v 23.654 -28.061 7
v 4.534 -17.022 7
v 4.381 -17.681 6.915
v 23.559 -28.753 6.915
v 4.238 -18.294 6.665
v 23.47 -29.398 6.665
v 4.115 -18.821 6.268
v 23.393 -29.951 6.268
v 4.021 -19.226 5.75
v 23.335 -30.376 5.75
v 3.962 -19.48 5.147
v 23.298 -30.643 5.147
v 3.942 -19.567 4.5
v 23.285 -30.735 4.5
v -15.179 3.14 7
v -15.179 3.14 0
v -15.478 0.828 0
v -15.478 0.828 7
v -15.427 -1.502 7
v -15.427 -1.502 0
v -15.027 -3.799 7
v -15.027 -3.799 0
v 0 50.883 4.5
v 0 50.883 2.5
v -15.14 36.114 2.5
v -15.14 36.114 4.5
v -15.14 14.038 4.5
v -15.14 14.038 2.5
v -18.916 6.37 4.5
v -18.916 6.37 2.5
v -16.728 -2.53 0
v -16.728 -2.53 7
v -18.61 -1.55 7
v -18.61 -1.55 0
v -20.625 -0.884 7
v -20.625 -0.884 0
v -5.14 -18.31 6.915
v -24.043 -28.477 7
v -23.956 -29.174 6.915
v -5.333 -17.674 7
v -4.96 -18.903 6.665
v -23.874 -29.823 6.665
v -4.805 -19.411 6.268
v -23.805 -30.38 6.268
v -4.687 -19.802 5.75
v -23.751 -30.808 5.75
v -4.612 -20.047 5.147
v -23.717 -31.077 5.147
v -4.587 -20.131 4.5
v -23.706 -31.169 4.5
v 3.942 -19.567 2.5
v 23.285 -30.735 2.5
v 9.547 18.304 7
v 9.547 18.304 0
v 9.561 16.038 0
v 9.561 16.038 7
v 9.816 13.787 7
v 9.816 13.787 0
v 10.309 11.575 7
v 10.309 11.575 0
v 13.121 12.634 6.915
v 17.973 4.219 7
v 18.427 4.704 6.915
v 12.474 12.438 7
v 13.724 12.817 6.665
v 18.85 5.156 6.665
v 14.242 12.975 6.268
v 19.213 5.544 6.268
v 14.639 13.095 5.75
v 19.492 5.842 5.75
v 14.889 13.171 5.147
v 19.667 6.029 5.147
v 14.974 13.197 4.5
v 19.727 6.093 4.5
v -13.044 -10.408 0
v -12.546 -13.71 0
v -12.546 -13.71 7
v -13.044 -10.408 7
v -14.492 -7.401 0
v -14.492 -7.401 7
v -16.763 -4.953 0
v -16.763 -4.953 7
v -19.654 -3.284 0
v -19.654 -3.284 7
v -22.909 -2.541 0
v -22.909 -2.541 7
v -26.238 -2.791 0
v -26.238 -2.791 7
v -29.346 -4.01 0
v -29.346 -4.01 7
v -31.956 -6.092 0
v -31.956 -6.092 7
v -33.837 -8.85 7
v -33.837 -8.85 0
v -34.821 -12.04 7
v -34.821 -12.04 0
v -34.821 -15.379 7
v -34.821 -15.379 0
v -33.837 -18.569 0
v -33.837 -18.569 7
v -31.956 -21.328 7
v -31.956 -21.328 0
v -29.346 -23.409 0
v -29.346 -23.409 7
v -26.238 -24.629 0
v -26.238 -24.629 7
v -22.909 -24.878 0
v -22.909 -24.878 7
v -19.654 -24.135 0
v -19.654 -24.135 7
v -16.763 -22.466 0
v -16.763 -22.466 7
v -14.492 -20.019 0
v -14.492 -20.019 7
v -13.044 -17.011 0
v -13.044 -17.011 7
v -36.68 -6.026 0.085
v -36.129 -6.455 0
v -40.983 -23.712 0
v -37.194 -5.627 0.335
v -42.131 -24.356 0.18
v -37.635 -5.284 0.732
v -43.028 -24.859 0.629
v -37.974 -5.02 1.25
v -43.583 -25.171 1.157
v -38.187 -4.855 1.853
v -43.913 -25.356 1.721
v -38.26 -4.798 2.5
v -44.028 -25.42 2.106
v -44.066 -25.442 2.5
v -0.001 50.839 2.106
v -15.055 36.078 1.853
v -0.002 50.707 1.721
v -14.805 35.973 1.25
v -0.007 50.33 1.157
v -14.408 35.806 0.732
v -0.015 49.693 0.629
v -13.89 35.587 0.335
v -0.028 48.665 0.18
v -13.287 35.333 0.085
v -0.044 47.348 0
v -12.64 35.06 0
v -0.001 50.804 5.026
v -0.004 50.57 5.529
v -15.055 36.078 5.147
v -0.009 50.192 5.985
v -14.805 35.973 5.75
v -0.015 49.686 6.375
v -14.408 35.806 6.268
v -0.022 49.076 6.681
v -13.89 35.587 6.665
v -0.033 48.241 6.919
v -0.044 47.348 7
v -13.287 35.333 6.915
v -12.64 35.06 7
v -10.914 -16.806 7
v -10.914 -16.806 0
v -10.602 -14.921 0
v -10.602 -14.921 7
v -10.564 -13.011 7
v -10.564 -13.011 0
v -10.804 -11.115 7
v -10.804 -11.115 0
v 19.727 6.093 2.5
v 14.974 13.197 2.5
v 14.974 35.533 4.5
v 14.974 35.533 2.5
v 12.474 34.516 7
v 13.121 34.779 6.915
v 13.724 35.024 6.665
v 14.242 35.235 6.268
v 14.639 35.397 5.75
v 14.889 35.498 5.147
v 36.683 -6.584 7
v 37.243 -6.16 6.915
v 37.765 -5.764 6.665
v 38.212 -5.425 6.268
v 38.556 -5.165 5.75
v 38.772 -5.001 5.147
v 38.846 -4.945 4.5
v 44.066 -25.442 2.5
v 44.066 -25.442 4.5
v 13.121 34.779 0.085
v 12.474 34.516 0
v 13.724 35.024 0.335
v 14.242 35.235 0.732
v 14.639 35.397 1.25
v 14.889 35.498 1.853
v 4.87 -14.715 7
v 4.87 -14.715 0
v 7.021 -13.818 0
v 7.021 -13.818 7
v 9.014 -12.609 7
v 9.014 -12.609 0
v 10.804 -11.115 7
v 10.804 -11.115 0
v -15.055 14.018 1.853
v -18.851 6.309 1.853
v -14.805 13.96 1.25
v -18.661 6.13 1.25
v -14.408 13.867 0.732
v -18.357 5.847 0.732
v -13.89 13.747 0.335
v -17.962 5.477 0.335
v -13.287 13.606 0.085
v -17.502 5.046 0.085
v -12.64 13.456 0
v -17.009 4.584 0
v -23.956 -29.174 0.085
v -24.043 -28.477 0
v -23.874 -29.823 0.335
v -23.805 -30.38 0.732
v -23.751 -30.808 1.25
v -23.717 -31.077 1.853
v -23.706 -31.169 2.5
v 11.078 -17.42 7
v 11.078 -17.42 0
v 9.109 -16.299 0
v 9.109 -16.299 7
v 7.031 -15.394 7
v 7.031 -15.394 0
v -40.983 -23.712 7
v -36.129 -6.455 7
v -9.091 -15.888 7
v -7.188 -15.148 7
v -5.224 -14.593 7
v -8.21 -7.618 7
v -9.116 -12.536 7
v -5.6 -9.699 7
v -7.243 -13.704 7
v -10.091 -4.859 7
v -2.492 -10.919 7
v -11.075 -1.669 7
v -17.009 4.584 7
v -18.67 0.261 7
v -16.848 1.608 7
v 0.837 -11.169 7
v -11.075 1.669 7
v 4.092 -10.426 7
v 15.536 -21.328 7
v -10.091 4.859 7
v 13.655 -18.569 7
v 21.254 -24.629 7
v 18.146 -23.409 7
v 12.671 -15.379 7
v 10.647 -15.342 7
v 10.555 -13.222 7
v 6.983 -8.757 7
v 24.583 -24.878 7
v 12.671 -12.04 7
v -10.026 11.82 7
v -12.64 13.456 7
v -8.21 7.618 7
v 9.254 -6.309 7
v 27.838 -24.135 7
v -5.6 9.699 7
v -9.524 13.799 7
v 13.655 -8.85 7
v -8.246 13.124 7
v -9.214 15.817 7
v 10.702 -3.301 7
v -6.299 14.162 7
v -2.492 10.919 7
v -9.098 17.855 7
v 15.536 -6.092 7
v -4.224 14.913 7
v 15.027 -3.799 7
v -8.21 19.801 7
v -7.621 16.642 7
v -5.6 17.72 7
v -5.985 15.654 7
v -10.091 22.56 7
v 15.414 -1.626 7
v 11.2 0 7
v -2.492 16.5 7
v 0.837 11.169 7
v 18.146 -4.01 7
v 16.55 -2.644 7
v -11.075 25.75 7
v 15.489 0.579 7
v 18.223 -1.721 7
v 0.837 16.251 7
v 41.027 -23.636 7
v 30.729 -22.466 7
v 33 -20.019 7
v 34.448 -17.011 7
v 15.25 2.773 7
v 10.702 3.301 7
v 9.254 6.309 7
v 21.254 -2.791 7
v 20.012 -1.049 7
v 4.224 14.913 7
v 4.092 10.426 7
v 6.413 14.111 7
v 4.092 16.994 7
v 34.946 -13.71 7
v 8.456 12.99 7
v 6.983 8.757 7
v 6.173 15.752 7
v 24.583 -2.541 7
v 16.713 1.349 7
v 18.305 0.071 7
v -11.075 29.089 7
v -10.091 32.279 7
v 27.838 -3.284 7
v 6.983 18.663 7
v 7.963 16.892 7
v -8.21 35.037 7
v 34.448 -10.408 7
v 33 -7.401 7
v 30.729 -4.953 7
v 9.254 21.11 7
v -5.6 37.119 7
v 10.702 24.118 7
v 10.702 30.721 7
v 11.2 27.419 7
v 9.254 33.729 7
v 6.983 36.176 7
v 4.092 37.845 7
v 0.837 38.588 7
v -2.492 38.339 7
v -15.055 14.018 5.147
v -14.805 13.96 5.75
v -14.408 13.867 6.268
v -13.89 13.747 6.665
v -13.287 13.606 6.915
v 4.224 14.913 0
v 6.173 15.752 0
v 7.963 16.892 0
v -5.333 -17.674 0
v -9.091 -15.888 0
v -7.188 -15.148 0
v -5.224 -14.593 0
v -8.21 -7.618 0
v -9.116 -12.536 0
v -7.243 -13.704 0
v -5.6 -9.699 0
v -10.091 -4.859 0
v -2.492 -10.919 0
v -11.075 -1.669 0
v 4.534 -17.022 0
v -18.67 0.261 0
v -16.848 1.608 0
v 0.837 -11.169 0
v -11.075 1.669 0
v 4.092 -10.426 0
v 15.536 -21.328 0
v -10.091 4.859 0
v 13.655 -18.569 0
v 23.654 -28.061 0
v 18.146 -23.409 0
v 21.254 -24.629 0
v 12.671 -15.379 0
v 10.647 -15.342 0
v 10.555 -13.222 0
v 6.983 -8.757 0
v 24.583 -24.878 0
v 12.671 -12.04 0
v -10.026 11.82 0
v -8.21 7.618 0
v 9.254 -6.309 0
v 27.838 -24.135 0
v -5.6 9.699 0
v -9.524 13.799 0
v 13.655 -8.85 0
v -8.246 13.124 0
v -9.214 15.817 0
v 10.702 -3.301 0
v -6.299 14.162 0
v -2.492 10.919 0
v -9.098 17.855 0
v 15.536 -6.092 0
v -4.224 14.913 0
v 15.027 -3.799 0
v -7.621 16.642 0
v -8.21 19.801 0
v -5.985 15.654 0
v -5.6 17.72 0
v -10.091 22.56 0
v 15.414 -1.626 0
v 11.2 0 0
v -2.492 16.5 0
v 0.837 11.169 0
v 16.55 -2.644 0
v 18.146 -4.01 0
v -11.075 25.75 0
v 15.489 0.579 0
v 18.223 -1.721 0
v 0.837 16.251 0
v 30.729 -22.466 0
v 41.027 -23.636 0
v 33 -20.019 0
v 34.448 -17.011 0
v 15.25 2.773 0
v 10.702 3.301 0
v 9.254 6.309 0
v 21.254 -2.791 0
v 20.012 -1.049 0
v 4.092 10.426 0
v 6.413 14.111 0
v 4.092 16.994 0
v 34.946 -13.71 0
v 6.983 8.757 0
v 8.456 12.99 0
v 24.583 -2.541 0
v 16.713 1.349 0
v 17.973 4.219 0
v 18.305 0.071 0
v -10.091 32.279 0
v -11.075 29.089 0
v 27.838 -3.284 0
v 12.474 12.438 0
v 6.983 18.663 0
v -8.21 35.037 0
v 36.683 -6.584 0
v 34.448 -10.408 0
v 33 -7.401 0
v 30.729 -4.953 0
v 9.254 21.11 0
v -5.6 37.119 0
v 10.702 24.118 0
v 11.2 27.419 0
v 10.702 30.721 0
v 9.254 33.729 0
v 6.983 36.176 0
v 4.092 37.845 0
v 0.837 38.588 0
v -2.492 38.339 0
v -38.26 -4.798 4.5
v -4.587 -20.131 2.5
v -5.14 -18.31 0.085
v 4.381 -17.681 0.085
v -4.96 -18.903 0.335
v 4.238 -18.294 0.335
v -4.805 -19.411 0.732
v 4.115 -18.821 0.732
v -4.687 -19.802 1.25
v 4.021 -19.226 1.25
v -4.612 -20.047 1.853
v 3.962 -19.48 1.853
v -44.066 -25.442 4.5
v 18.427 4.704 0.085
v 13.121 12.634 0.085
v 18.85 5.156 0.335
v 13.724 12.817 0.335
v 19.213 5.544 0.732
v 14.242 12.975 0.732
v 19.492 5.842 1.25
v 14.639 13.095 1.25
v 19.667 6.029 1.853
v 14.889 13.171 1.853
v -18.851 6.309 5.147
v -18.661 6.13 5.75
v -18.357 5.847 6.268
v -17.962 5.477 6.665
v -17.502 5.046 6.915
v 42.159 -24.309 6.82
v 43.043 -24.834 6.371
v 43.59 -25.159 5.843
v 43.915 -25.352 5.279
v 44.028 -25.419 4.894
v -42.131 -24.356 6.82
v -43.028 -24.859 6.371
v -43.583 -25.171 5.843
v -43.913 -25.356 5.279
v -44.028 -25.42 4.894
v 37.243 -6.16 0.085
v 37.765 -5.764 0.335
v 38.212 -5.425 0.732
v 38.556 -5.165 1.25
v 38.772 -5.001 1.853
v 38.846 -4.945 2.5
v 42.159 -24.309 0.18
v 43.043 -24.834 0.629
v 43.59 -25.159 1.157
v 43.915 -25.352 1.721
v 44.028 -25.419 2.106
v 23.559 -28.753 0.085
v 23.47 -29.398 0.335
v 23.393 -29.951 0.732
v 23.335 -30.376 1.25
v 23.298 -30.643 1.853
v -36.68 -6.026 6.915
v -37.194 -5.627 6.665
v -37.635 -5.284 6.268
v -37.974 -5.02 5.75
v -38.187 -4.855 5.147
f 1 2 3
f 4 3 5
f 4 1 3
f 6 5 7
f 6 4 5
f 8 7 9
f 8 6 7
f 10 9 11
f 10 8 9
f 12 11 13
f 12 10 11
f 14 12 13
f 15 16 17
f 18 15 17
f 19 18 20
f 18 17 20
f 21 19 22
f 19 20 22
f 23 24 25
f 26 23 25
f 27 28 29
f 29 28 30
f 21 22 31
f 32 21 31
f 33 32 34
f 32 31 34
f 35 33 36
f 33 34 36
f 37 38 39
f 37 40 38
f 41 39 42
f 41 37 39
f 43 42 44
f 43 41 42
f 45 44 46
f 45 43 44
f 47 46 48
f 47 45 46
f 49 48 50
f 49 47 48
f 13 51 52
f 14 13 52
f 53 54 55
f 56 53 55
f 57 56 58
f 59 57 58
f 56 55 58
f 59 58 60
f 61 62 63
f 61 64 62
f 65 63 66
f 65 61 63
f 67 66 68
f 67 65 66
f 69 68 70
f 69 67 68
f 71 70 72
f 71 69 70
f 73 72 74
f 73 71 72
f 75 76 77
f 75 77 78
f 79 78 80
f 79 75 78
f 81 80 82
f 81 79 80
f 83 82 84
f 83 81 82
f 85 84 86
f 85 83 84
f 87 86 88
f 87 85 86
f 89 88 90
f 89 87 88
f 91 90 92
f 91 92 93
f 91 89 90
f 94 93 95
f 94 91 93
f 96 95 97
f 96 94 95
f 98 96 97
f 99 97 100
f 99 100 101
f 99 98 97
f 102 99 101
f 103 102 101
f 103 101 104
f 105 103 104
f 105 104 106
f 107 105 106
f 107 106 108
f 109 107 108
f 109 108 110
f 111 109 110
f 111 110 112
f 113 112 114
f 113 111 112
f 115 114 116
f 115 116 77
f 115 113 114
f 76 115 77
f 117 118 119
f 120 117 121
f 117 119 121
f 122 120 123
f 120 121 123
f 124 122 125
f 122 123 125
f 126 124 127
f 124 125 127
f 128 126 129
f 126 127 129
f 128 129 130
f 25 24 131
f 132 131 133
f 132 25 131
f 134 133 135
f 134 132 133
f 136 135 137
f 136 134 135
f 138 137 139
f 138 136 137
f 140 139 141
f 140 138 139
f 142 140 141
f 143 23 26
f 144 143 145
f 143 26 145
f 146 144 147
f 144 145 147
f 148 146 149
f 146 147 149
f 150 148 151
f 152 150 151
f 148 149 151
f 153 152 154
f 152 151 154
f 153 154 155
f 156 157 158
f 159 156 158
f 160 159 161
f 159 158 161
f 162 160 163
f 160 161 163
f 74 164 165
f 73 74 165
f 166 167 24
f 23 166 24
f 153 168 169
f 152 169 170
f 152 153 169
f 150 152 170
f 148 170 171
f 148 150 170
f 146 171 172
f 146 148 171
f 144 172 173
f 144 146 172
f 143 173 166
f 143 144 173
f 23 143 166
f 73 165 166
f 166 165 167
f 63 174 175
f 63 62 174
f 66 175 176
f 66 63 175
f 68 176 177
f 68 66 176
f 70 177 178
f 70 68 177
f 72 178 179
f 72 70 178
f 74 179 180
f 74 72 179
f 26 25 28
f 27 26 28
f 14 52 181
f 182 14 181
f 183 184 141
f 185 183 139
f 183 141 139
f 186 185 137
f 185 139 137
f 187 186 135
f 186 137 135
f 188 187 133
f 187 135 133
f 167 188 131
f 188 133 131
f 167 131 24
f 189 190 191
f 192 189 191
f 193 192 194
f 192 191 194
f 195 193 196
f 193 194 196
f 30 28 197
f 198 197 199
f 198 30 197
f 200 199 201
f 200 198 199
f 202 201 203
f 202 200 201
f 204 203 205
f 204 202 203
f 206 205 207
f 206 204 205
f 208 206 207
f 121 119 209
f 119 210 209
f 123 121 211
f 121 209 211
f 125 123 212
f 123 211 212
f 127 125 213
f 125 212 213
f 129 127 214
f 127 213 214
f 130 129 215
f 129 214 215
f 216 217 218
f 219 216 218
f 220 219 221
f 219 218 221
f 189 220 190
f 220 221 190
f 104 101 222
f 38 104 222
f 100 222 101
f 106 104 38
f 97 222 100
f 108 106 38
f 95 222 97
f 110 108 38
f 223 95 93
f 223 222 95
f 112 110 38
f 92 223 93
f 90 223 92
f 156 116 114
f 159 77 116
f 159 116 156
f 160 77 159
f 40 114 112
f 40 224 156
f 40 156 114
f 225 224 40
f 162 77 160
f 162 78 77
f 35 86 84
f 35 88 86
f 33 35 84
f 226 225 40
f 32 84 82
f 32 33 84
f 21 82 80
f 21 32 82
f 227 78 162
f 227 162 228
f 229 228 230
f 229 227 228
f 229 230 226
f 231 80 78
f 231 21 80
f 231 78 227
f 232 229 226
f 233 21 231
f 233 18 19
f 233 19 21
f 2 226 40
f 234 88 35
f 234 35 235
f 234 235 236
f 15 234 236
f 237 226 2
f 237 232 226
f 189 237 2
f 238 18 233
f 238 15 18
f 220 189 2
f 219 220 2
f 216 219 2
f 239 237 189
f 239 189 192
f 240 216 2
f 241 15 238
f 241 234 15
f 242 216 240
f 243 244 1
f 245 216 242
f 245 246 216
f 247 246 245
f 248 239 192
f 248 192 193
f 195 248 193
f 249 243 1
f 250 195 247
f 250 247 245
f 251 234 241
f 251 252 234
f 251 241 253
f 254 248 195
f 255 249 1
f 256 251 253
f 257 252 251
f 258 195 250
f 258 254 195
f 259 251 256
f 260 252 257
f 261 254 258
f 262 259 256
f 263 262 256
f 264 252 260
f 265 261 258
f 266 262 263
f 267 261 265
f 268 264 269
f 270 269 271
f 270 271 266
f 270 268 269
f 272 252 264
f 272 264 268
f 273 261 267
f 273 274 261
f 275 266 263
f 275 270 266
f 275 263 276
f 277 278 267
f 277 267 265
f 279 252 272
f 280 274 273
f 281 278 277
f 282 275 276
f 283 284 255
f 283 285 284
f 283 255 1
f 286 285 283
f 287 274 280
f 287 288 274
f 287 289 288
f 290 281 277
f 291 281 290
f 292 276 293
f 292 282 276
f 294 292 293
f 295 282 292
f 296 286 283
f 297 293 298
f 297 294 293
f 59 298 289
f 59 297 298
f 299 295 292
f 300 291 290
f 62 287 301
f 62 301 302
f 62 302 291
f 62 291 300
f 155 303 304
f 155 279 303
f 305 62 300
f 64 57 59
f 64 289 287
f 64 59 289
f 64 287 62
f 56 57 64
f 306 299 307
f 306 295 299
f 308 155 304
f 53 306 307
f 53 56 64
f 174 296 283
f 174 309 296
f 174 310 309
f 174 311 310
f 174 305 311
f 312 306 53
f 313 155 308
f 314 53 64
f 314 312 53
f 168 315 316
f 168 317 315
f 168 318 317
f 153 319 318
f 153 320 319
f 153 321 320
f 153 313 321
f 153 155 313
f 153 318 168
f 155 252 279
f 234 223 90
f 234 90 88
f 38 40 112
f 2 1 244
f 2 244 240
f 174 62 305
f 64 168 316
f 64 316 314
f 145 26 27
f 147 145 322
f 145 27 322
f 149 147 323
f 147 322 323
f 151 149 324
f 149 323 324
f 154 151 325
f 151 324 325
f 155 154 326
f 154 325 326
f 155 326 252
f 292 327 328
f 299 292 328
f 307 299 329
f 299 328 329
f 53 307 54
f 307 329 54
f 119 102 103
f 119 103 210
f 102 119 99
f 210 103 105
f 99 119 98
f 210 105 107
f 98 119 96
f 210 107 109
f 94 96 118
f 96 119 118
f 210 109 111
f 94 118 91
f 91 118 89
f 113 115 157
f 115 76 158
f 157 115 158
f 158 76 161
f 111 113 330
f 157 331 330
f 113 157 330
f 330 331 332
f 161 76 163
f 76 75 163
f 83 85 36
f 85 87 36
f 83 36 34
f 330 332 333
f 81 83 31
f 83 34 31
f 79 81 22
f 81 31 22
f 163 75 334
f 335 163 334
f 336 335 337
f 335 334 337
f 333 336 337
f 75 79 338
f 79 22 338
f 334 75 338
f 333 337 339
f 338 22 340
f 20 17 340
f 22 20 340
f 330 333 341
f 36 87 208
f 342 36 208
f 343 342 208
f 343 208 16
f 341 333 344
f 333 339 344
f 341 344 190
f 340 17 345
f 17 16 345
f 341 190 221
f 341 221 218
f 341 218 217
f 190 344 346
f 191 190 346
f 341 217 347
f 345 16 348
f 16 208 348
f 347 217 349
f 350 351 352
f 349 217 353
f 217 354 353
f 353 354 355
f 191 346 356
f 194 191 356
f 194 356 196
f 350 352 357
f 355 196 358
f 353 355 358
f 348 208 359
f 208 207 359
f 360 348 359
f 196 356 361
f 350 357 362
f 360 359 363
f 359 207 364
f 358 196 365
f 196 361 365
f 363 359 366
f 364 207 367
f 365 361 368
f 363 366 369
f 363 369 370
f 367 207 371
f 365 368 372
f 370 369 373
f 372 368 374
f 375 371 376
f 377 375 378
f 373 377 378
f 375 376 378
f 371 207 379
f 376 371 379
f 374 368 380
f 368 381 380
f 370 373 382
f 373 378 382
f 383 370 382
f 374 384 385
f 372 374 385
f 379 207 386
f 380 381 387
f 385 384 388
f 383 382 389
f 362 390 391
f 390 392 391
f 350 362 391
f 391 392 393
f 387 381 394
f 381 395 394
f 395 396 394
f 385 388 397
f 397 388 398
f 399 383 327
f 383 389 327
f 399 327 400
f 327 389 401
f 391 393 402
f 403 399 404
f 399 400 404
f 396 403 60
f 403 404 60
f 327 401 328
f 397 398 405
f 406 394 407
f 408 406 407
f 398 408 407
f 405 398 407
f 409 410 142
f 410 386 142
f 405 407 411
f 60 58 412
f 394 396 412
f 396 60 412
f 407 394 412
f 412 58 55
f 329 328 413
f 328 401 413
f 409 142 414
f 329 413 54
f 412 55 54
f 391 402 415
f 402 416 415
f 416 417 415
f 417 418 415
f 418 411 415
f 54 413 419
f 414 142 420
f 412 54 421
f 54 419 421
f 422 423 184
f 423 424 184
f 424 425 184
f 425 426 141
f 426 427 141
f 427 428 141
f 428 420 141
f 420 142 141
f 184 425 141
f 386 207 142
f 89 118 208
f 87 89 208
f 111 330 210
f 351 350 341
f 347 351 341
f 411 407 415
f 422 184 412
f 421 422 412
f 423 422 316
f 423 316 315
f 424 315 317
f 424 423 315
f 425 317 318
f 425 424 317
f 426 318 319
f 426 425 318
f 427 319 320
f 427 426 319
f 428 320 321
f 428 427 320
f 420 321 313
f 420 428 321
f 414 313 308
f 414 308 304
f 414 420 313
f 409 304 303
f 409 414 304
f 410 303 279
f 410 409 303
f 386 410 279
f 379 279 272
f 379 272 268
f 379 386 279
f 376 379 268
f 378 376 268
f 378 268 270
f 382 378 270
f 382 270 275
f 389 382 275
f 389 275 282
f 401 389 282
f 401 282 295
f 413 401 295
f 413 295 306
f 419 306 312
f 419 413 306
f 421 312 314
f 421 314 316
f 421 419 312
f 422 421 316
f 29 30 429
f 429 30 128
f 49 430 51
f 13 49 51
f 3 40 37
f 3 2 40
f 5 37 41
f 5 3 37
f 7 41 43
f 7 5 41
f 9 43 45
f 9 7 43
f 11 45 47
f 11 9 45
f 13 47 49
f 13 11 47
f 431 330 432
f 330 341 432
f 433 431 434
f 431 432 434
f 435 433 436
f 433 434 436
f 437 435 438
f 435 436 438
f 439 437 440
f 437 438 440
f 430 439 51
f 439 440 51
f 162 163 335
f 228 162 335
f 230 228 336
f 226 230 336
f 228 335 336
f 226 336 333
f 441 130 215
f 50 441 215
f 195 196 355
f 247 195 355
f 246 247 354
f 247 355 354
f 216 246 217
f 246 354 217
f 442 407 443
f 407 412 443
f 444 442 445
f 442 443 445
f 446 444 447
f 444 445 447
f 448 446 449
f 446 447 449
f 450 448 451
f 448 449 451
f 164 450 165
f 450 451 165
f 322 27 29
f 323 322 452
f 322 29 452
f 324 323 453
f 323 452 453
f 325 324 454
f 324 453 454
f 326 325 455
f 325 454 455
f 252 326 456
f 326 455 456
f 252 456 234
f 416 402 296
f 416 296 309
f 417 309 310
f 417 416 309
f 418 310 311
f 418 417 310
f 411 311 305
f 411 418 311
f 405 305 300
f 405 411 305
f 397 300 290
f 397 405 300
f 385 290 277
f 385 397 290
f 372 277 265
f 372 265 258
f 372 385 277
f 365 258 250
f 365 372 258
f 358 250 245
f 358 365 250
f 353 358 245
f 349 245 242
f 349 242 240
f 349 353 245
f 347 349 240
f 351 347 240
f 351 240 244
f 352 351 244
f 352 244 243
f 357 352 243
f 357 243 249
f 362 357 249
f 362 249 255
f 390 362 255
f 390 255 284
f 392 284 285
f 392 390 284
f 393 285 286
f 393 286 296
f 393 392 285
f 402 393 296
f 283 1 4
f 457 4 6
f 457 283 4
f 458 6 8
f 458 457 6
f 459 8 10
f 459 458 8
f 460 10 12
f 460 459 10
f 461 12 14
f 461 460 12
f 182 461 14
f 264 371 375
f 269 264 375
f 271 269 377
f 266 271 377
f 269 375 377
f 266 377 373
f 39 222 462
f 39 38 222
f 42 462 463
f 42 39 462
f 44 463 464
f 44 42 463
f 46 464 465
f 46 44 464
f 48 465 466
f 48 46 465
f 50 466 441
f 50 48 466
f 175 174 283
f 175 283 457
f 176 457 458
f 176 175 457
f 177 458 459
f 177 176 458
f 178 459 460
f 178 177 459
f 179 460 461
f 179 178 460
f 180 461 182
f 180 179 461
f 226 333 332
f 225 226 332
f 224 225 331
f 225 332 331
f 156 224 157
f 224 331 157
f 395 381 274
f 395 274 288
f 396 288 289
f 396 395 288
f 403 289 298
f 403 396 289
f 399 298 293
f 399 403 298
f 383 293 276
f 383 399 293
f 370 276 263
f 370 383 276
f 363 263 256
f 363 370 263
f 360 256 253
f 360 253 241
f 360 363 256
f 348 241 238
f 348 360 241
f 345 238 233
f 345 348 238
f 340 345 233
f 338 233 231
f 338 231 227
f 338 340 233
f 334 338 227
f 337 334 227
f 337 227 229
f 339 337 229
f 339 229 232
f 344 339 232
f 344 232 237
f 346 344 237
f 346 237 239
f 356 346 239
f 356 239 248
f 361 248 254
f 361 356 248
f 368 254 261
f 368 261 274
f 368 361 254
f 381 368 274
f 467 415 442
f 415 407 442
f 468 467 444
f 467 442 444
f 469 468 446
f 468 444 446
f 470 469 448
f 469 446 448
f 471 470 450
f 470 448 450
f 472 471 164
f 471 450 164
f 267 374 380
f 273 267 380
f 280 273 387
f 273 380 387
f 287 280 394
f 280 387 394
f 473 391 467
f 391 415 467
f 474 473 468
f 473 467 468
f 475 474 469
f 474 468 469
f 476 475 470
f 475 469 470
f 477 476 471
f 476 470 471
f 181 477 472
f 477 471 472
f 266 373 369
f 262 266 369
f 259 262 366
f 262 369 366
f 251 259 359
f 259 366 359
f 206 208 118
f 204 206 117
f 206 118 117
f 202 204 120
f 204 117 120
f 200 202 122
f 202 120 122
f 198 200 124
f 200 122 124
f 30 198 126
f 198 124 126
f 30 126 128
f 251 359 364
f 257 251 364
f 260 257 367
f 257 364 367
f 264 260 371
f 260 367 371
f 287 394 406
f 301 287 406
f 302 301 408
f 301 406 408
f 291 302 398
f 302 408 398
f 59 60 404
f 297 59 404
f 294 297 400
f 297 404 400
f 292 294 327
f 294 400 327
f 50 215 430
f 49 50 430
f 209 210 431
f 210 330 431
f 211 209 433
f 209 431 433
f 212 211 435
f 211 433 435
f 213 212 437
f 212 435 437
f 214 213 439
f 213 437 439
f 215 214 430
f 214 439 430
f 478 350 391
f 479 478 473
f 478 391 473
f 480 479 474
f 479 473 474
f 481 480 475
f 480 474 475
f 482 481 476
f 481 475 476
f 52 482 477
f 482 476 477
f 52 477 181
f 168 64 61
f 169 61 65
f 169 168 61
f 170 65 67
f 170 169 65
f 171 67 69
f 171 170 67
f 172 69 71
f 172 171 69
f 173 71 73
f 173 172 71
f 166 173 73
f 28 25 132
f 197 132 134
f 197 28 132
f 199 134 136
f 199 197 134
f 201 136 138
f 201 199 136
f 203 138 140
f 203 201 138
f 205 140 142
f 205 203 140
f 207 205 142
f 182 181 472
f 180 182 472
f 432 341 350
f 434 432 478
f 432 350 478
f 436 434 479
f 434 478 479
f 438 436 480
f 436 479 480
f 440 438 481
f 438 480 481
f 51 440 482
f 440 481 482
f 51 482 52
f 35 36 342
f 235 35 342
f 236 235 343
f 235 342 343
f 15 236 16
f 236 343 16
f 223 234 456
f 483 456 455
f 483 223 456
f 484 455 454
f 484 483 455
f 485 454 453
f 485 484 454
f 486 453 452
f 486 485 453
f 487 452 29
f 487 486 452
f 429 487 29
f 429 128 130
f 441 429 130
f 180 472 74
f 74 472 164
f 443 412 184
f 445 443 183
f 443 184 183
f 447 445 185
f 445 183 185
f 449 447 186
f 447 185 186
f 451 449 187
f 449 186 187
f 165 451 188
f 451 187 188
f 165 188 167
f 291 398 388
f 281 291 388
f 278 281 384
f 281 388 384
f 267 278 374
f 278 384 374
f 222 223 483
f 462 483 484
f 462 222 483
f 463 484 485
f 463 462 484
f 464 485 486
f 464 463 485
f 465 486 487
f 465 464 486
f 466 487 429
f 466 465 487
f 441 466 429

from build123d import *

# Parameters (mm, degrees)
F0_R     = 11.2
F1_DEPTH = 7
F3_DEPTH = 7
F4_DEPTH = 7
F5_R     = 2.5


# Not quite as in the source:
# - the program builds the solid bodies; features that only make, move or delete a surface that nothing else refers to are left out


with BuildPart() as f1:
    # F0 (on Top) → F1 (new body)
    with BuildSketch(Plane.XY):
        Polygon((-15.1401171461, 36.1142084002), (-15.1401171461, 14.037729241), (-18.916093286, 6.3695226165), (-38.2596134255, -4.7984639431), (-44.0662825692, -25.4416801035), (-23.7057633391, -31.1688302649), (-4.5869715611, -20.1305906853), (3.9418782472, -19.5665786343), (23.2853983866, -30.7345651939), (44.0662825692, -25.4416801035), (38.8458804852, -4.9453781354), (19.7270887072, 6.0928614443), (14.9742150389, 13.1970560178), (14.9742150389, 35.533029137), (0, 50.8833602071), align=None)
        with Locations((-23.7459174679, -13.7097118422)):
            Circle(F0_R, mode=Mode.SUBTRACT)
        with BuildLine():
            ThreePointArc((-5.2235825218, -14.5932924879), (-8.1486251459, -15.4948890799), (-10.9142807021, -16.8063387022))
            ThreePointArc((-10.9142807021, -16.8063387022), (-10.5484153212, -13.966494024), (-10.8035365954, -11.1145668846))
            ThreePointArc((-10.8035365954, -11.1145668846), (-8.2001536422, -13.1532307911), (-5.2235825218, -14.5932924879))
        make_face(mode=Mode.SUBTRACT)
        with BuildLine():
            ThreePointArc((-15.1785458421, 3.1403417202), (-15.4963179195, -0.3378327056), (-15.0272655718, -3.7988537))
            ThreePointArc((-15.0272655718, -3.7988537), (-17.6493915658, -2.0019207643), (-20.6250668218, -0.88394515))
            ThreePointArc((-20.6250668218, -0.88394515), (-17.7408860989, 0.9104067971), (-15.1785458421, 3.1403417202))
        make_face(mode=Mode.SUBTRACT)
        with BuildLine():
            ThreePointArc((4.8696572148, -14.7151771518), (8.040730665, -13.2512886306), (10.8035365954, -11.1145668846))
            ThreePointArc((10.8035365954, -11.1145668846), (10.5584100211, -14.2838610751), (11.0780523663, -17.4198592474))
            ThreePointArc((11.0780523663, -17.4198592474), (8.0820076354, -15.8192614458), (4.8696572148, -14.7151771518))
        make_face(mode=Mode.SUBTRACT)
        with Locations((23.7459174679, -13.7097118422)):
            Circle(F0_R, mode=Mode.SUBTRACT)
        with BuildLine():
            ThreePointArc((15.2499532803, 2.7728910813), (17.493280145, 0.6905281577), (20.0118566117, -1.0488750009))
            ThreePointArc((20.0118566117, -1.0488750009), (17.3695462872, -2.1519486258), (15.0272655718, -3.7988537))
            ThreePointArc((15.0272655718, -3.7988537), (15.491108828, -0.5249259735), (15.2499532803, 2.7728910813))
        make_face(mode=Mode.SUBTRACT)
        Circle(F0_R, mode=Mode.SUBTRACT)
        with BuildLine():
            ThreePointArc((-9.0975759097, 17.8552137031), (-6.821130966, 16.1184426499), (-4.2237289764, 14.9134205846))
            ThreePointArc((-4.2237289764, 14.9134205846), (-7.2909551859, 13.6781567646), (-10.0263707585, 11.8204014066))
            ThreePointArc((-10.0263707585, 11.8204014066), (-9.3446549991, 14.8043609222), (-9.0975759097, 17.8552137031))
        make_face(mode=Mode.SUBTRACT)
        with BuildLine():
            ThreePointArc((4.2237289764, 14.9134205846), (7.0909815446, 16.2857818394), (9.5470144555, 18.3038043974))
            ThreePointArc((9.5470144555, 18.3038043974), (9.6588784635, 14.9088546487), (10.3088886273, 11.5748354317))
            ThreePointArc((10.3088886273, 11.5748354317), (7.4555872545, 13.5891213362), (4.2237289764, 14.9134205846))
        make_face(mode=Mode.SUBTRACT)
        with Locations((0, 27.4194236845)):
            Circle(F0_R, mode=Mode.SUBTRACT)
    extrude(amount=F1_DEPTH)

    # F0 (on Top) → F3 (join)
    with BuildSketch(Plane.XY):
        Polygon((-15.1401171461, 36.1142084002), (-15.1401171461, 14.037729241), (-18.916093286, 6.3695226165), (-38.2596134255, -4.7984639431), (-44.0662825692, -25.4416801035), (-23.7057633391, -31.1688302649), (-4.5869715611, -20.1305906853), (3.9418782472, -19.5665786343), (23.2853983866, -30.7345651939), (44.0662825692, -25.4416801035), (38.8458804852, -4.9453781354), (19.7270887072, 6.0928614443), (14.9742150389, 13.1970560178), (14.9742150389, 35.533029137), (0, 50.8833602071), align=None)
        with Locations((-23.7459174679, -13.7097118422)):
            Circle(F0_R, mode=Mode.SUBTRACT)
        with BuildLine():
            ThreePointArc((-5.2235825218, -14.5932924879), (-8.1486251459, -15.4948890799), (-10.9142807021, -16.8063387022))
            ThreePointArc((-10.9142807021, -16.8063387022), (-10.5484153212, -13.966494024), (-10.8035365954, -11.1145668846))
            ThreePointArc((-10.8035365954, -11.1145668846), (-8.2001536422, -13.1532307911), (-5.2235825218, -14.5932924879))
        make_face(mode=Mode.SUBTRACT)
        with BuildLine():
            ThreePointArc((-15.1785458421, 3.1403417202), (-15.4963179195, -0.3378327056), (-15.0272655718, -3.7988537))
            ThreePointArc((-15.0272655718, -3.7988537), (-17.6493915658, -2.0019207643), (-20.6250668218, -0.88394515))
            ThreePointArc((-20.6250668218, -0.88394515), (-17.7408860989, 0.9104067971), (-15.1785458421, 3.1403417202))
        make_face(mode=Mode.SUBTRACT)
        with BuildLine():
            ThreePointArc((4.8696572148, -14.7151771518), (8.040730665, -13.2512886306), (10.8035365954, -11.1145668846))
            ThreePointArc((10.8035365954, -11.1145668846), (10.5584100211, -14.2838610751), (11.0780523663, -17.4198592474))
            ThreePointArc((11.0780523663, -17.4198592474), (8.0820076354, -15.8192614458), (4.8696572148, -14.7151771518))
        make_face(mode=Mode.SUBTRACT)
        with Locations((23.7459174679, -13.7097118422)):
            Circle(F0_R, mode=Mode.SUBTRACT)
        with BuildLine():
            ThreePointArc((15.2499532803, 2.7728910813), (17.493280145, 0.6905281577), (20.0118566117, -1.0488750009))
            ThreePointArc((20.0118566117, -1.0488750009), (17.3695462872, -2.1519486258), (15.0272655718, -3.7988537))
            ThreePointArc((15.0272655718, -3.7988537), (15.491108828, -0.5249259735), (15.2499532803, 2.7728910813))
        make_face(mode=Mode.SUBTRACT)
        Circle(F0_R, mode=Mode.SUBTRACT)
        with BuildLine():
            ThreePointArc((-9.0975759097, 17.8552137031), (-6.821130966, 16.1184426499), (-4.2237289764, 14.9134205846))
            ThreePointArc((-4.2237289764, 14.9134205846), (-7.2909551859, 13.6781567646), (-10.0263707585, 11.8204014066))
            ThreePointArc((-10.0263707585, 11.8204014066), (-9.3446549991, 14.8043609222), (-9.0975759097, 17.8552137031))
        make_face(mode=Mode.SUBTRACT)
        with BuildLine():
            ThreePointArc((4.2237289764, 14.9134205846), (7.0909815446, 16.2857818394), (9.5470144555, 18.3038043974))
            ThreePointArc((9.5470144555, 18.3038043974), (9.6588784635, 14.9088546487), (10.3088886273, 11.5748354317))
            ThreePointArc((10.3088886273, 11.5748354317), (7.4555872545, 13.5891213362), (4.2237289764, 14.9134205846))
        make_face(mode=Mode.SUBTRACT)
        with Locations((0, 27.4194236845)):
            Circle(F0_R, mode=Mode.SUBTRACT)
    extrude(amount=F3_DEPTH)

    # F0 (on Top) → F4 (join)
    with BuildSketch(Plane.XY):
        Polygon((-15.1401171461, 36.1142084002), (-15.1401171461, 14.037729241), (-18.916093286, 6.3695226165), (-38.2596134255, -4.7984639431), (-44.0662825692, -25.4416801035), (-23.7057633391, -31.1688302649), (-4.5869715611, -20.1305906853), (3.9418782472, -19.5665786343), (23.2853983866, -30.7345651939), (44.0662825692, -25.4416801035), (38.8458804852, -4.9453781354), (19.7270887072, 6.0928614443), (14.9742150389, 13.1970560178), (14.9742150389, 35.533029137), (0, 50.8833602071), align=None)
        with Locations((-23.7459174679, -13.7097118422)):
            Circle(F0_R, mode=Mode.SUBTRACT)
        with BuildLine():
            ThreePointArc((-5.2235825218, -14.5932924879), (-8.1486251459, -15.4948890799), (-10.9142807021, -16.8063387022))
            ThreePointArc((-10.9142807021, -16.8063387022), (-10.5484153212, -13.966494024), (-10.8035365954, -11.1145668846))
            ThreePointArc((-10.8035365954, -11.1145668846), (-8.2001536422, -13.1532307911), (-5.2235825218, -14.5932924879))
        make_face(mode=Mode.SUBTRACT)
        with BuildLine():
            ThreePointArc((-15.1785458421, 3.1403417202), (-15.4963179195, -0.3378327056), (-15.0272655718, -3.7988537))
            ThreePointArc((-15.0272655718, -3.7988537), (-17.6493915658, -2.0019207643), (-20.6250668218, -0.88394515))
            ThreePointArc((-20.6250668218, -0.88394515), (-17.7408860989, 0.9104067971), (-15.1785458421, 3.1403417202))
        make_face(mode=Mode.SUBTRACT)
        with BuildLine():
            ThreePointArc((4.8696572148, -14.7151771518), (8.040730665, -13.2512886306), (10.8035365954, -11.1145668846))
            ThreePointArc((10.8035365954, -11.1145668846), (10.5584100211, -14.2838610751), (11.0780523663, -17.4198592474))
            ThreePointArc((11.0780523663, -17.4198592474), (8.0820076354, -15.8192614458), (4.8696572148, -14.7151771518))
        make_face(mode=Mode.SUBTRACT)
        with Locations((23.7459174679, -13.7097118422)):
            Circle(F0_R, mode=Mode.SUBTRACT)
        with BuildLine():
            ThreePointArc((15.2499532803, 2.7728910813), (17.493280145, 0.6905281577), (20.0118566117, -1.0488750009))
            ThreePointArc((20.0118566117, -1.0488750009), (17.3695462872, -2.1519486258), (15.0272655718, -3.7988537))
            ThreePointArc((15.0272655718, -3.7988537), (15.491108828, -0.5249259735), (15.2499532803, 2.7728910813))
        make_face(mode=Mode.SUBTRACT)
        Circle(F0_R, mode=Mode.SUBTRACT)
        with BuildLine():
            ThreePointArc((-9.0975759097, 17.8552137031), (-6.821130966, 16.1184426499), (-4.2237289764, 14.9134205846))
            ThreePointArc((-4.2237289764, 14.9134205846), (-7.2909551859, 13.6781567646), (-10.0263707585, 11.8204014066))
            ThreePointArc((-10.0263707585, 11.8204014066), (-9.3446549991, 14.8043609222), (-9.0975759097, 17.8552137031))
        make_face(mode=Mode.SUBTRACT)
        with BuildLine():
            ThreePointArc((4.2237289764, 14.9134205846), (7.0909815446, 16.2857818394), (9.5470144555, 18.3038043974))
            ThreePointArc((9.5470144555, 18.3038043974), (9.6588784635, 14.9088546487), (10.3088886273, 11.5748354317))
            ThreePointArc((10.3088886273, 11.5748354317), (7.4555872545, 13.5891213362), (4.2237289764, 14.9134205846))
        make_face(mode=Mode.SUBTRACT)
        with Locations((0, 27.4194236845)):
            Circle(F0_R, mode=Mode.SUBTRACT)
    extrude(amount=F4_DEPTH)

    # F5
    f5_edges = [f1.edges().sort_by_distance(p)[0] for p in [
        (-7.570059, 43.498784, 7),
        (-15.140117, 25.075969, 7),
        (-17.028105, 10.203626, 7),
        (-28.587853, 0.785529, 7),
        (-41.162948, -15.120072, 7),
        (-33.886023, -28.305255, 7),
        (-14.146367, -25.64971, 7),
        (-0.322547, -19.848585, 7),
        (13.613638, -25.150572, 7),
        (33.67584, -28.088123, 7),
        (41.456082, -15.193529, 7),
        (29.286485, 0.573742, 7),
        (17.350652, 9.644959, 7),
        (14.974215, 24.365043, 7),
        (7.487108, 43.208195, 7),
        (7.487108, 43.208195, 0),
        (-7.570059, 43.498784, 0),
        (-15.140117, 25.075969, 0),
        (-17.028105, 10.203626, 0),
        (-14.146367, -25.64971, 0),
        (-0.322547, -19.848585, 0),
        (13.613638, -25.150572, 0),
        (33.67584, -28.088123, 0),
        (41.456082, -15.193529, 0),
        (29.286485, 0.573742, 0),
        (17.350652, 9.644959, 0),
        (14.974215, 24.365043, 0),
        (-28.587853, 0.785529, 0),
        (-41.162948, -15.120072, 0),
        (-33.886023, -28.305255, 0),
    ]]
    fillet(f5_edges, radius=F5_R)


solid = f1.part
